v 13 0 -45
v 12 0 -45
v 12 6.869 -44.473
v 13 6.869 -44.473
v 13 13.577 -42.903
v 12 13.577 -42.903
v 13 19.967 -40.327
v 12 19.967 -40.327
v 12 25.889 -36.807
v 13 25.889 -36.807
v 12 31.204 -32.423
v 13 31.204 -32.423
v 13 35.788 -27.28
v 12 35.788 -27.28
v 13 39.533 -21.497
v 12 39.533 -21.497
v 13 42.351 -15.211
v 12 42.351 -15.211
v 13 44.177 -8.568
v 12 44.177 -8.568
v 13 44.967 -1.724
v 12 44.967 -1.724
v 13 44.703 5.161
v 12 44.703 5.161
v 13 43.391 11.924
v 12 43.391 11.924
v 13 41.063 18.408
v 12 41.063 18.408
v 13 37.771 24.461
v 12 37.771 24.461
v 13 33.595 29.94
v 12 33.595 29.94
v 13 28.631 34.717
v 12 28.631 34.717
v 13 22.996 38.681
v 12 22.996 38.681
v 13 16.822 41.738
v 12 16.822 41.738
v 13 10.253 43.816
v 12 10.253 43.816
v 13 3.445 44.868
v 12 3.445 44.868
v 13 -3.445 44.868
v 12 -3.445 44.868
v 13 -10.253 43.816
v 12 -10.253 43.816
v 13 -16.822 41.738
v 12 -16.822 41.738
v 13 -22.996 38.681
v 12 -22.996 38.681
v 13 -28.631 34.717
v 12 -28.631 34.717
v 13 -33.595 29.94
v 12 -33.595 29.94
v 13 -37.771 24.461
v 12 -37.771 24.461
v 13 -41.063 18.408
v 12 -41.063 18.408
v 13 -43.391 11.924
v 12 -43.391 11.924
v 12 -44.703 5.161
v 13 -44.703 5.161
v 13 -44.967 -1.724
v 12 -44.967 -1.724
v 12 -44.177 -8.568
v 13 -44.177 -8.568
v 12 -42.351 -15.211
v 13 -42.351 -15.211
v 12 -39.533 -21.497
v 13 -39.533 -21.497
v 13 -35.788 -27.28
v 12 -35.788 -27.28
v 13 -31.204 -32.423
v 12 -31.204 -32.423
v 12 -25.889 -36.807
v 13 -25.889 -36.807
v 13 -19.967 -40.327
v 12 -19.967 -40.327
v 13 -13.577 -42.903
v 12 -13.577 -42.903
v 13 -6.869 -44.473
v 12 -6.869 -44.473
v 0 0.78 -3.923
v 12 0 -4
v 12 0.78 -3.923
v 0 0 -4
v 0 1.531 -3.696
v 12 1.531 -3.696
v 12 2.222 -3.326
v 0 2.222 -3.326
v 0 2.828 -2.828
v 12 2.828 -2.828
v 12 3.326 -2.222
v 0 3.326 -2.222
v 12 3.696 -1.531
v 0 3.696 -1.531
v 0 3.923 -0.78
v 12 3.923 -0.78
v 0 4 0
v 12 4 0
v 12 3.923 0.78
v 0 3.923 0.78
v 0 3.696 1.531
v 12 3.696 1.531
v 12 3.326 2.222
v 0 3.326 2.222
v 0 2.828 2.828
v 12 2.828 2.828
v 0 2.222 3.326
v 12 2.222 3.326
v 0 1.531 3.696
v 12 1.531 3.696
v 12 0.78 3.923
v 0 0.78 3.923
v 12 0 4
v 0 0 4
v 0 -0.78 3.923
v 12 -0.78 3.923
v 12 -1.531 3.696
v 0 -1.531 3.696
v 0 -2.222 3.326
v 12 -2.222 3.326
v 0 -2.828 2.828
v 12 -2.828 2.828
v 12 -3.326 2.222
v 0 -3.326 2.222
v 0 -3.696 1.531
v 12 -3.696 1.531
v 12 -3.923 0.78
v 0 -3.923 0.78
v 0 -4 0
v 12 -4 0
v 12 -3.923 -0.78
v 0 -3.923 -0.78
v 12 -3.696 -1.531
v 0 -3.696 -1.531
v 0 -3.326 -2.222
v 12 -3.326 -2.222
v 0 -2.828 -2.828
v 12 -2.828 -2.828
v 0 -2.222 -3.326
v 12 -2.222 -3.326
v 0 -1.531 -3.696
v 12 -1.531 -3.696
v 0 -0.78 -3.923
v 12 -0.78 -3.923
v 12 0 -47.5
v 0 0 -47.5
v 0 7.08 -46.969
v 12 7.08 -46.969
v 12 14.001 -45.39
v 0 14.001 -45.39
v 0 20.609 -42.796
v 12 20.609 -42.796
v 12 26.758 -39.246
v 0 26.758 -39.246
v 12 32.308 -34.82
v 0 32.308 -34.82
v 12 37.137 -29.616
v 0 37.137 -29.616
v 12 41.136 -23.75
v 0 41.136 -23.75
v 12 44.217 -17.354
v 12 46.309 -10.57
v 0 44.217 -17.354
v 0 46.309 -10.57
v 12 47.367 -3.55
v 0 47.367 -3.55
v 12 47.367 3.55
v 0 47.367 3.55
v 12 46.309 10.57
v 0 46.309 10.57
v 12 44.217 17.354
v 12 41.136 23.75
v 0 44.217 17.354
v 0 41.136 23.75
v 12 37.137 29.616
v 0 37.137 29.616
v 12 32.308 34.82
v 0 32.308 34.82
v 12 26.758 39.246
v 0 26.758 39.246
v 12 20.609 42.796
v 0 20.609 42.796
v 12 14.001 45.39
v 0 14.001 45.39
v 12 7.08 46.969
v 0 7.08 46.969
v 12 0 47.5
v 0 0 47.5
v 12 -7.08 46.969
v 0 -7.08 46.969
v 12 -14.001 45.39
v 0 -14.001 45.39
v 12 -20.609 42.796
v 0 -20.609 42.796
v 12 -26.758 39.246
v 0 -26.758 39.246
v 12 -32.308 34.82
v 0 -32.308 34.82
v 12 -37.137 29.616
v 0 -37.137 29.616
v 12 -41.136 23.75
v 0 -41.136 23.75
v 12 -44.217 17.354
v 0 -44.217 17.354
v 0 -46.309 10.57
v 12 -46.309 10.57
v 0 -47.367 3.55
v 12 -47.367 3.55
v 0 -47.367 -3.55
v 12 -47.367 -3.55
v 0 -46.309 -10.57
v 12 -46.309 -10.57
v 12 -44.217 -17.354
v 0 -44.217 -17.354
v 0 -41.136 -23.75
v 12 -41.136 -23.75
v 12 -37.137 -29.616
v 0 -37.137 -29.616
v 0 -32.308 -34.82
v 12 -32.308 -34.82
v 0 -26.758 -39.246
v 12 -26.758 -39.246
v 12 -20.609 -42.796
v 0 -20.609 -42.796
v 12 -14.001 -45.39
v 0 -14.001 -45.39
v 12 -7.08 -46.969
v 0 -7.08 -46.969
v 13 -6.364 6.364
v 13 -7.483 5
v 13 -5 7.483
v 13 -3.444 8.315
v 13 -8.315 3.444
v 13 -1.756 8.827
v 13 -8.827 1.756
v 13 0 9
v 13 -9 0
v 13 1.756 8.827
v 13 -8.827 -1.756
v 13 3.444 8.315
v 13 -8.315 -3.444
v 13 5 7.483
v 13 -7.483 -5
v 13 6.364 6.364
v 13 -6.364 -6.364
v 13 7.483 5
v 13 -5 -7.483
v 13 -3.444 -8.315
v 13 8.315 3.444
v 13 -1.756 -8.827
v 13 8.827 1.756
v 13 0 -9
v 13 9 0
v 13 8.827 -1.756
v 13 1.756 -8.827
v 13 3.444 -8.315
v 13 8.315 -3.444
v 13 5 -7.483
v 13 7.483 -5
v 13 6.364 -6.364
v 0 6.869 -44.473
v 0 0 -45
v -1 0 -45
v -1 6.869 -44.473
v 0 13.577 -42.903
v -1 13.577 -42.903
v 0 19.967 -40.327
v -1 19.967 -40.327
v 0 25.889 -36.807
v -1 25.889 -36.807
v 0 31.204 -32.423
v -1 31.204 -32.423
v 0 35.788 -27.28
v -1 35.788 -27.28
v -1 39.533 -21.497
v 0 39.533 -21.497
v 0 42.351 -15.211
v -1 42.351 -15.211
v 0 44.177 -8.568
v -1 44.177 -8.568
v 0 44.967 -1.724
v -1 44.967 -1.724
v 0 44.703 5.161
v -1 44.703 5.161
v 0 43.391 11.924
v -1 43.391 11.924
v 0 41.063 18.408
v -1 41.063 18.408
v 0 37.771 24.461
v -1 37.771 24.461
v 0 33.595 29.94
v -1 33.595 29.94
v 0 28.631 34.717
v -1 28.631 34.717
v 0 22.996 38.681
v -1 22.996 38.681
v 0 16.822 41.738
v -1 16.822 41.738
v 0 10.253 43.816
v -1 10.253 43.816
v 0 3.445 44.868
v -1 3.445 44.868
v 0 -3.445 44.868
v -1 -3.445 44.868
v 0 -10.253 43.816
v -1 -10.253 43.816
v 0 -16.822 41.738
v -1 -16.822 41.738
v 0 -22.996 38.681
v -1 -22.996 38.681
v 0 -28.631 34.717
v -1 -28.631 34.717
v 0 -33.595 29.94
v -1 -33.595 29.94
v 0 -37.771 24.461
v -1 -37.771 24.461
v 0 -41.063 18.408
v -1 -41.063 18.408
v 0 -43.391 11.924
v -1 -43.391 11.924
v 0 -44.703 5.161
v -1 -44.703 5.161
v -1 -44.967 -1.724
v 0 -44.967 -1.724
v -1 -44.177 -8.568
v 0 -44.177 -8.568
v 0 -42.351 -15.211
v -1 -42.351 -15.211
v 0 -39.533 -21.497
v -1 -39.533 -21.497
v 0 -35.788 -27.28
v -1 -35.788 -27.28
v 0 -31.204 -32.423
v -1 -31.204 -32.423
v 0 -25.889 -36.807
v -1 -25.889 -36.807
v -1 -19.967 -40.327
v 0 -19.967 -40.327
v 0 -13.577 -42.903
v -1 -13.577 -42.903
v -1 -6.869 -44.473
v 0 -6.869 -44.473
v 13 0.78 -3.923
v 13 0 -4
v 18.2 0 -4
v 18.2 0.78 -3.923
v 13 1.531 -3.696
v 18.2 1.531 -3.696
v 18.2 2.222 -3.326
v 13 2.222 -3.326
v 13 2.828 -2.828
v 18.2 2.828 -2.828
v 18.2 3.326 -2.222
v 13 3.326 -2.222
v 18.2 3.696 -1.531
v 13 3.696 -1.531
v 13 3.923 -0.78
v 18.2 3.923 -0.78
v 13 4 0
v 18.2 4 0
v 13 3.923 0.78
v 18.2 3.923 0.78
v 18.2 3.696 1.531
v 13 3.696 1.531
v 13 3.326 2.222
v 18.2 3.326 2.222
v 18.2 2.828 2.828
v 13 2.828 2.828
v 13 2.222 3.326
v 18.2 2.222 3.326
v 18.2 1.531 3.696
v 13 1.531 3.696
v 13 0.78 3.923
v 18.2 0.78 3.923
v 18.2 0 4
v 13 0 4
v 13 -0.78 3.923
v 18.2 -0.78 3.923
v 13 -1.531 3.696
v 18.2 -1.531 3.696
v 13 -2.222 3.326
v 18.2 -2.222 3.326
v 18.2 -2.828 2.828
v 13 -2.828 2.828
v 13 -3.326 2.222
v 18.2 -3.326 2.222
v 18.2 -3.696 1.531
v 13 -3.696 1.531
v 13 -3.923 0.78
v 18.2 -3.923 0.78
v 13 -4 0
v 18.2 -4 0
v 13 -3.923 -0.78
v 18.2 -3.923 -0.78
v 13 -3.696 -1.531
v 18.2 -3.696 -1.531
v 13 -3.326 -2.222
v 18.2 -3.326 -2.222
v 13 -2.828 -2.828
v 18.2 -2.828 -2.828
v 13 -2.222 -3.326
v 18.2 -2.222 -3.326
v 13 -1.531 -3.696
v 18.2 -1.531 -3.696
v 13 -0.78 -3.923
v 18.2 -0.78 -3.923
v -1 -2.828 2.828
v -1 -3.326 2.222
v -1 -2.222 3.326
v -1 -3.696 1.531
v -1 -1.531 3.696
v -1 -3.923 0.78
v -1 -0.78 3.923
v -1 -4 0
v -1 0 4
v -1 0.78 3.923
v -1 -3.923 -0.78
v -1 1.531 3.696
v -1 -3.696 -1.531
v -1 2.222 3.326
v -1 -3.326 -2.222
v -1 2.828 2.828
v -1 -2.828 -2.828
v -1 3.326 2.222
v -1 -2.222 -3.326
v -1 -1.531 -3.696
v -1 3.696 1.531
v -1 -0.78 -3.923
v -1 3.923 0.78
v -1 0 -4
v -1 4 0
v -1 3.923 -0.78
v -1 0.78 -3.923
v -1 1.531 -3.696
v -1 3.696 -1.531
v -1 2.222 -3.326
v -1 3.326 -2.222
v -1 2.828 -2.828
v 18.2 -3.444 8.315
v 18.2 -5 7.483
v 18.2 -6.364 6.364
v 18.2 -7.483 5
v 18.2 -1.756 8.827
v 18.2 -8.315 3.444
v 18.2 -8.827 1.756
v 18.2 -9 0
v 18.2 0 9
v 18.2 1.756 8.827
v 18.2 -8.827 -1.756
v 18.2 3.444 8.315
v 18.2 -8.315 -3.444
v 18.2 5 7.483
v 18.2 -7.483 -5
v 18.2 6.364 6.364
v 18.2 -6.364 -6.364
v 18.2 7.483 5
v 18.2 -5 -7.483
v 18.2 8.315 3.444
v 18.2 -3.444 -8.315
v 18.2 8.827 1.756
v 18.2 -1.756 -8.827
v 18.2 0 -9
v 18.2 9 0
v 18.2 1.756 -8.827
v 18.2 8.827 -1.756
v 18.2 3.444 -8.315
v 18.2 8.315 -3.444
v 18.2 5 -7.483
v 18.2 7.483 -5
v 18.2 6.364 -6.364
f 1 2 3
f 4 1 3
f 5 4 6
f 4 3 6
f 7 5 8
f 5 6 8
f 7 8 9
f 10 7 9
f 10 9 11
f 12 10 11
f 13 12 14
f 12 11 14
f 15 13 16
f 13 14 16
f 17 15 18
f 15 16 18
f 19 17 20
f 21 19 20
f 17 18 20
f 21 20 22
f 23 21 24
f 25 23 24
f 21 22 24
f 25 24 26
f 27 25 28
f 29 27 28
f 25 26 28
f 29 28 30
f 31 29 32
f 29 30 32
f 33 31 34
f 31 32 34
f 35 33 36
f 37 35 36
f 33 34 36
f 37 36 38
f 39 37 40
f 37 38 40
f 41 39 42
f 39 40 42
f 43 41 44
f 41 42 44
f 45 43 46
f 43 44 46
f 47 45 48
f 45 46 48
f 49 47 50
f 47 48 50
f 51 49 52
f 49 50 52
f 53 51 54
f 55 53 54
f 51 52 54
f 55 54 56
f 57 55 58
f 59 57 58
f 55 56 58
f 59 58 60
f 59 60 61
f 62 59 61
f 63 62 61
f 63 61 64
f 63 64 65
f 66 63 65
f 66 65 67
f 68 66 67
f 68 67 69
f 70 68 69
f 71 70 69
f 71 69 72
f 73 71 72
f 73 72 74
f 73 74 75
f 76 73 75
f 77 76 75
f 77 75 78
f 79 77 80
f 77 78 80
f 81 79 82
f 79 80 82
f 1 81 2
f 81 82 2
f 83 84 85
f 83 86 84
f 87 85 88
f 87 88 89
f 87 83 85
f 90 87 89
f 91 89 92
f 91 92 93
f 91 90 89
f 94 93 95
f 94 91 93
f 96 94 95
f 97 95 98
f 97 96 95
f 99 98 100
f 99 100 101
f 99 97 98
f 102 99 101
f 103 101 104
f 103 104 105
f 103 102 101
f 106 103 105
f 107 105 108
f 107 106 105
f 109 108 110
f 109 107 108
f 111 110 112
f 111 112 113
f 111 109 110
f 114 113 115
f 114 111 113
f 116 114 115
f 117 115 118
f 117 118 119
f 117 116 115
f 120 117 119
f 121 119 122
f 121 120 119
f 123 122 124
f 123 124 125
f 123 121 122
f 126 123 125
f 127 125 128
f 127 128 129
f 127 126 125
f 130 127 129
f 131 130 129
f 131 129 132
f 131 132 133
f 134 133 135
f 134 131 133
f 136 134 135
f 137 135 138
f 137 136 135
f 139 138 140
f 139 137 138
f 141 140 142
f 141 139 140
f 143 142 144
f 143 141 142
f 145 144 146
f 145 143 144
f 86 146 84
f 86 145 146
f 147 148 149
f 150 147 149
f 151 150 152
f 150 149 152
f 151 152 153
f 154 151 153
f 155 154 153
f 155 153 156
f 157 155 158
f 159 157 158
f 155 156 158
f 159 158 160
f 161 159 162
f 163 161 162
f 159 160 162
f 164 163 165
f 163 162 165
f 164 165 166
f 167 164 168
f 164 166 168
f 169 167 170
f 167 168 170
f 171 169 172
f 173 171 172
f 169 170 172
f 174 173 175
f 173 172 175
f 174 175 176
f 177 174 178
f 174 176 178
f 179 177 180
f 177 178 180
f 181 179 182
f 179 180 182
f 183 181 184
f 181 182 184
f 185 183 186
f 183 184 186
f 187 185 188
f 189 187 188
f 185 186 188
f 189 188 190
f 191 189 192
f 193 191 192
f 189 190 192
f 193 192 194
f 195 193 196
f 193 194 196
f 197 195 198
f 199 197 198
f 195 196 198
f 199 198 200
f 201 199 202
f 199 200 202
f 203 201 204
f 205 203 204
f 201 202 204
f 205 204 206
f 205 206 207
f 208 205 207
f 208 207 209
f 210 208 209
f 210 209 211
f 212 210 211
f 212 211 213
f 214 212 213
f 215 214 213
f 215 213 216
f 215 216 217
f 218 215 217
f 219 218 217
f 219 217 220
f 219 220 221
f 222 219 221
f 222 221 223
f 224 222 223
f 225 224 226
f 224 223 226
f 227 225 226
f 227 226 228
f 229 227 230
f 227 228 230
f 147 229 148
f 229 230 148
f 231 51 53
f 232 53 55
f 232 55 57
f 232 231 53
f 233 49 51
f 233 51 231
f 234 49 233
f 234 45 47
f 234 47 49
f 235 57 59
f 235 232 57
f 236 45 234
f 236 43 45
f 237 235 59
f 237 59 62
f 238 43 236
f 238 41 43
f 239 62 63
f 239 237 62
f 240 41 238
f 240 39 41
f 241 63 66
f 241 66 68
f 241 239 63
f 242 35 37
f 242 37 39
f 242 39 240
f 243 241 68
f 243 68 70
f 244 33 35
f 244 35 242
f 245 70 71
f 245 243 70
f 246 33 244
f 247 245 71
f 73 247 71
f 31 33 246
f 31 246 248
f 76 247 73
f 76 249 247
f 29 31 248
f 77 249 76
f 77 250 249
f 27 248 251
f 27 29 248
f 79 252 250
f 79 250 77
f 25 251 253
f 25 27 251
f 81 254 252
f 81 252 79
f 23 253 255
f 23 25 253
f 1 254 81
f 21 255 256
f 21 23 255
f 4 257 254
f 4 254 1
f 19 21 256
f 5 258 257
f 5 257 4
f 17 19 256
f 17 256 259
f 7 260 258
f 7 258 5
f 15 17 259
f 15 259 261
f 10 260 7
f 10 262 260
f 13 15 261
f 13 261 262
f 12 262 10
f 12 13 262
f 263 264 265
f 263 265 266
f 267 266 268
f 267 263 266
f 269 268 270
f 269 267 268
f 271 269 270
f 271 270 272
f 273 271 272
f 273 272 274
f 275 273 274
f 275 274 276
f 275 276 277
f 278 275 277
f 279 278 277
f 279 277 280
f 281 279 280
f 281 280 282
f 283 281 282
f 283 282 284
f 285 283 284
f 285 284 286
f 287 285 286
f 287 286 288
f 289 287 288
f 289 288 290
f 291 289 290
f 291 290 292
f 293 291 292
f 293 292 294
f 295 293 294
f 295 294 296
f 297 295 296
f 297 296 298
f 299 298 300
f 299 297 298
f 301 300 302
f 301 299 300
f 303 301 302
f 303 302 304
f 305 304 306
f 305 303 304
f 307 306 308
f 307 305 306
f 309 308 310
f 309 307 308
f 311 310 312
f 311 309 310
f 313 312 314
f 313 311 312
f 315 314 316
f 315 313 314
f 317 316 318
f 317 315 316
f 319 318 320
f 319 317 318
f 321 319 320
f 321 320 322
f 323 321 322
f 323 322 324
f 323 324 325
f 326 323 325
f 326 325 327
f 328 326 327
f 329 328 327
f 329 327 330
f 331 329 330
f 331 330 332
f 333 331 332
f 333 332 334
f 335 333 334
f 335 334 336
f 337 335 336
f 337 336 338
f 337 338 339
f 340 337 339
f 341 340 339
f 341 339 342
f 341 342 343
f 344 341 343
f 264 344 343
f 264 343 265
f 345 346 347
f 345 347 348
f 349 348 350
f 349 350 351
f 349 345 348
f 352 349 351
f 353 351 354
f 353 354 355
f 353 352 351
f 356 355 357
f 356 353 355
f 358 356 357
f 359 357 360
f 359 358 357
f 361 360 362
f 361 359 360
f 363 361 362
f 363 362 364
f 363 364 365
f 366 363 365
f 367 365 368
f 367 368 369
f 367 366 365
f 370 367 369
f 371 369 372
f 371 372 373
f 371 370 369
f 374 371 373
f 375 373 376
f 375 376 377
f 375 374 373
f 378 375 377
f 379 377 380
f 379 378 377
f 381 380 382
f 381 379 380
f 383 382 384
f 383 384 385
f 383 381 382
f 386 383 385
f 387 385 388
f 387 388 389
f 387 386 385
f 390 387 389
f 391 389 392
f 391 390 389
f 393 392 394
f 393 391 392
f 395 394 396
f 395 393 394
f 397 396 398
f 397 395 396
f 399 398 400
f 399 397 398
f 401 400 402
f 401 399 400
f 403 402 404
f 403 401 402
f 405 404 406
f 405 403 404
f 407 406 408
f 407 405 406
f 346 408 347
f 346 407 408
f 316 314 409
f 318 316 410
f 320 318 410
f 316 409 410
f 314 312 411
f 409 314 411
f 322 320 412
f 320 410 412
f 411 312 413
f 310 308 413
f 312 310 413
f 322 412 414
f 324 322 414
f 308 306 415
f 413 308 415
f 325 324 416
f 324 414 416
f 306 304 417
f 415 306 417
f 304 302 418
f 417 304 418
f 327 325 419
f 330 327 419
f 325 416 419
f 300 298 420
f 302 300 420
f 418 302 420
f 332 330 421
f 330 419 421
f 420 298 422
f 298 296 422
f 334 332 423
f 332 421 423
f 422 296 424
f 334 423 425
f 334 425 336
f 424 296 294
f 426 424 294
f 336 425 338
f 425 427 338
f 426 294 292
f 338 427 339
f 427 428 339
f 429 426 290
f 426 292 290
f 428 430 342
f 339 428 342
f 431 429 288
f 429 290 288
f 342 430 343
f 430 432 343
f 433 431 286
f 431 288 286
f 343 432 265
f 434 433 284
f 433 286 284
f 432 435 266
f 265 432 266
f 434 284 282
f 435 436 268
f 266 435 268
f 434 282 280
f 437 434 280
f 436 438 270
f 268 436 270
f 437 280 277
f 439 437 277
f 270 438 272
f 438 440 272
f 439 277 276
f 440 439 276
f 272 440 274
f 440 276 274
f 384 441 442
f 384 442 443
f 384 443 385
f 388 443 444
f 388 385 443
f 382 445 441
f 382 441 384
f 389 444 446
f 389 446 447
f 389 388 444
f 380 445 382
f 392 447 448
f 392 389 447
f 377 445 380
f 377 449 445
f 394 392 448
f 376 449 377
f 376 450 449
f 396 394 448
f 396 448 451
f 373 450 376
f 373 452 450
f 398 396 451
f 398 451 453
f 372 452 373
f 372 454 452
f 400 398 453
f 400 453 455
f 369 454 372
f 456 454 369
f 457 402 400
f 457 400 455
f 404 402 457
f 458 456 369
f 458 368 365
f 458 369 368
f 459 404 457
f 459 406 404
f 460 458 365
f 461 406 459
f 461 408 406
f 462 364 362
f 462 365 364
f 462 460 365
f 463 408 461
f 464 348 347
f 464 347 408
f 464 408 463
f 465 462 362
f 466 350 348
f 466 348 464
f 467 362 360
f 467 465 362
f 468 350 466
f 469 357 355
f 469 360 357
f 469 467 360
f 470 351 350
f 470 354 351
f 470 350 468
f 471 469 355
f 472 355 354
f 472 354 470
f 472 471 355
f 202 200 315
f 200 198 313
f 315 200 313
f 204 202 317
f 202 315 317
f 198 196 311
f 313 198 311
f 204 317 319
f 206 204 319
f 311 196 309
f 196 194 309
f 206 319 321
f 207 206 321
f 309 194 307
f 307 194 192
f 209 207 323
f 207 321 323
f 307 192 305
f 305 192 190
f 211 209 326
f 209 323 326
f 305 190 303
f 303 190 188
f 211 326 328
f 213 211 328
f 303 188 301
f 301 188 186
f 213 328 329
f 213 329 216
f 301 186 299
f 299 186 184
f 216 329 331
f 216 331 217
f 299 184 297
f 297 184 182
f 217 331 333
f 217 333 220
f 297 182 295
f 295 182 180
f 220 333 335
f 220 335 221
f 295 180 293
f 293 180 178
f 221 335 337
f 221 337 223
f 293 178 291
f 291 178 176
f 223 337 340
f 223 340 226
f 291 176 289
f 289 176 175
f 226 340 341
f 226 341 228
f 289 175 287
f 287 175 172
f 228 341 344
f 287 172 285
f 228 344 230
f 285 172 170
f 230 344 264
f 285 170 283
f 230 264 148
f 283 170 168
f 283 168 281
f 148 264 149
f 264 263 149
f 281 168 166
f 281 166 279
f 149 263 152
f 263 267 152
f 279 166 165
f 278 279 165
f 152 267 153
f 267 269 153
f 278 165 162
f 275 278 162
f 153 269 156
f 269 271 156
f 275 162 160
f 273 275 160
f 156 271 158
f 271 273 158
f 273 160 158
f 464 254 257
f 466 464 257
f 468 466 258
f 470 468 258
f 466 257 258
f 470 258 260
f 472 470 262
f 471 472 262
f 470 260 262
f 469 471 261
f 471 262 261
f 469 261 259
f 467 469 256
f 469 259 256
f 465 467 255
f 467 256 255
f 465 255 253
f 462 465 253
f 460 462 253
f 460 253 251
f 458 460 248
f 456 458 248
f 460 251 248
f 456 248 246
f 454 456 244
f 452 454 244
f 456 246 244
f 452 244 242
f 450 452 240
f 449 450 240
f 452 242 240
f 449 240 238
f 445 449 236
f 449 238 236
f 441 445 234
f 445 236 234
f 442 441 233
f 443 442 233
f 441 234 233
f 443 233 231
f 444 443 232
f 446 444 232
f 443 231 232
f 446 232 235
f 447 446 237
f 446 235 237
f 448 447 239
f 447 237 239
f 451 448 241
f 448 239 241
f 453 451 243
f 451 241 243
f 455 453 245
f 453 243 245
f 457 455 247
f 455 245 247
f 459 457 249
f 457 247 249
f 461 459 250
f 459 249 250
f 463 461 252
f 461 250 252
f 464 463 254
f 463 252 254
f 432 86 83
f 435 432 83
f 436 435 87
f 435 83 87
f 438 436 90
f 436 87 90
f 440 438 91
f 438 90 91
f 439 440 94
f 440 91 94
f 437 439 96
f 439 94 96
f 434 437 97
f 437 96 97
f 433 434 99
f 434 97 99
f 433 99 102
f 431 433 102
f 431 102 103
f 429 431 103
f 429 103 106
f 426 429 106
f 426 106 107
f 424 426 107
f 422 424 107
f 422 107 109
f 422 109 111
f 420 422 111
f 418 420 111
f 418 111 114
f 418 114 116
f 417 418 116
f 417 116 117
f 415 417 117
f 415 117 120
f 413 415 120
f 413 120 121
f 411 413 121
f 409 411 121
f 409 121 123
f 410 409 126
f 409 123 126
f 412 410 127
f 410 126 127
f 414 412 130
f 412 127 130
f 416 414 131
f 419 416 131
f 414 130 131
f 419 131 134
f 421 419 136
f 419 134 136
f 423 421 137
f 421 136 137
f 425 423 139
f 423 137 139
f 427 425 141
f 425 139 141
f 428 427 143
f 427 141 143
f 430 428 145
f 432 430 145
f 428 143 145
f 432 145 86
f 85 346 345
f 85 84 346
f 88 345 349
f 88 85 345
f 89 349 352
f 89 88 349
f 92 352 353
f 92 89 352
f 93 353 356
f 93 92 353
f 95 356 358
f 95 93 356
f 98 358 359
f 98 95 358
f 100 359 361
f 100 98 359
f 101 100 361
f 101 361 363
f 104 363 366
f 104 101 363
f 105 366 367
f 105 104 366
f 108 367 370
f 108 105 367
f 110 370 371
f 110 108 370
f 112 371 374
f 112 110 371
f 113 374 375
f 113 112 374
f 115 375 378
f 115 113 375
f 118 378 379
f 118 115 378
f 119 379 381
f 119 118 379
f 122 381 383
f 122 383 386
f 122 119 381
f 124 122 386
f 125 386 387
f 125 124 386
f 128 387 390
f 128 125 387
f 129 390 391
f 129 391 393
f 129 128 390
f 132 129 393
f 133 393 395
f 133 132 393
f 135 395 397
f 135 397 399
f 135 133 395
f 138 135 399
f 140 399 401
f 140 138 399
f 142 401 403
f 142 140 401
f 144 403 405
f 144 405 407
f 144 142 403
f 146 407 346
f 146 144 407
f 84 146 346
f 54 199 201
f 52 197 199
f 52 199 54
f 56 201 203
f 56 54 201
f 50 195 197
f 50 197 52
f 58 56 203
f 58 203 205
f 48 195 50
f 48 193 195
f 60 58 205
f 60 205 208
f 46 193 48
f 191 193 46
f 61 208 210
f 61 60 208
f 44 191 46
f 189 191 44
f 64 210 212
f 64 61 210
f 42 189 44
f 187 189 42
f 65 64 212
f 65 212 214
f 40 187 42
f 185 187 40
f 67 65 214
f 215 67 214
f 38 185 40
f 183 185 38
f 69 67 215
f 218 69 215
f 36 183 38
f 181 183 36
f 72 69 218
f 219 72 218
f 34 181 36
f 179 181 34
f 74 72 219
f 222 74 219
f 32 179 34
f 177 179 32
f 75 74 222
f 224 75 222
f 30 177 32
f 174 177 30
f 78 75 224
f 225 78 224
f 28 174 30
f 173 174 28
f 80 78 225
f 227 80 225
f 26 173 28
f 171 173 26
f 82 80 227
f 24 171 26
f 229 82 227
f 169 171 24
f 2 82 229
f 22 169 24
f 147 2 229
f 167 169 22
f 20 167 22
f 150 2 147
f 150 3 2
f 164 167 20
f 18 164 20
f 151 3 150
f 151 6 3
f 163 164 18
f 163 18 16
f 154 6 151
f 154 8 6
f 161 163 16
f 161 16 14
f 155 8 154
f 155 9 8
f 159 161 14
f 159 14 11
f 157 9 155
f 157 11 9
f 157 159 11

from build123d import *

# Parameters (mm, degrees)
SKETCH_2_R           = 47.5
SKETCH_2_R_2         = 4
EXTRUDE_1_DEPTH      = 12
SKETCH_3_R           = 45
SKETCH_3_R_2         = 4
EXTRUDE_2_DEPTH      = 1
EXTRUDE_2_DEPTH_BACK = 13
SKETCH_4_R           = 9
SKETCH_4_R_2         = 4
EXTRUDE_3_DEPTH      = 5.2


with BuildPart() as part:
    # 草图2 → 凸台-拉伸1 (new body)
    with BuildSketch(Plane(origin=(0, 0, 0), x_dir=(0, 0, -1), z_dir=(1, 0, 0))):
        Circle(SKETCH_2_R)
        Circle(SKETCH_2_R_2, mode=Mode.SUBTRACT)
    extrude(amount=EXTRUDE_1_DEPTH)

    # 草图3 → 凸台-拉伸2 (add, two sides)
    with BuildSketch(Plane(origin=(12, 0, 0), x_dir=(0, 0, -1), z_dir=(1, 0, 0))) as extrude_2_sk:
        Circle(SKETCH_3_R)
        Circle(SKETCH_3_R_2, mode=Mode.SUBTRACT)
    extrude(amount=EXTRUDE_2_DEPTH)
    extrude(extrude_2_sk.sketch, amount=-EXTRUDE_2_DEPTH_BACK)

    # 草图4 → 凸台-拉伸3 (add)
    with BuildSketch(Plane(origin=(13, 0, 0), x_dir=(0, 0, -1), z_dir=(1, 0, 0))):
        Circle(SKETCH_4_R)
        Circle(SKETCH_4_R_2, mode=Mode.SUBTRACT)
    extrude(amount=EXTRUDE_3_DEPTH)


solid = part.part
